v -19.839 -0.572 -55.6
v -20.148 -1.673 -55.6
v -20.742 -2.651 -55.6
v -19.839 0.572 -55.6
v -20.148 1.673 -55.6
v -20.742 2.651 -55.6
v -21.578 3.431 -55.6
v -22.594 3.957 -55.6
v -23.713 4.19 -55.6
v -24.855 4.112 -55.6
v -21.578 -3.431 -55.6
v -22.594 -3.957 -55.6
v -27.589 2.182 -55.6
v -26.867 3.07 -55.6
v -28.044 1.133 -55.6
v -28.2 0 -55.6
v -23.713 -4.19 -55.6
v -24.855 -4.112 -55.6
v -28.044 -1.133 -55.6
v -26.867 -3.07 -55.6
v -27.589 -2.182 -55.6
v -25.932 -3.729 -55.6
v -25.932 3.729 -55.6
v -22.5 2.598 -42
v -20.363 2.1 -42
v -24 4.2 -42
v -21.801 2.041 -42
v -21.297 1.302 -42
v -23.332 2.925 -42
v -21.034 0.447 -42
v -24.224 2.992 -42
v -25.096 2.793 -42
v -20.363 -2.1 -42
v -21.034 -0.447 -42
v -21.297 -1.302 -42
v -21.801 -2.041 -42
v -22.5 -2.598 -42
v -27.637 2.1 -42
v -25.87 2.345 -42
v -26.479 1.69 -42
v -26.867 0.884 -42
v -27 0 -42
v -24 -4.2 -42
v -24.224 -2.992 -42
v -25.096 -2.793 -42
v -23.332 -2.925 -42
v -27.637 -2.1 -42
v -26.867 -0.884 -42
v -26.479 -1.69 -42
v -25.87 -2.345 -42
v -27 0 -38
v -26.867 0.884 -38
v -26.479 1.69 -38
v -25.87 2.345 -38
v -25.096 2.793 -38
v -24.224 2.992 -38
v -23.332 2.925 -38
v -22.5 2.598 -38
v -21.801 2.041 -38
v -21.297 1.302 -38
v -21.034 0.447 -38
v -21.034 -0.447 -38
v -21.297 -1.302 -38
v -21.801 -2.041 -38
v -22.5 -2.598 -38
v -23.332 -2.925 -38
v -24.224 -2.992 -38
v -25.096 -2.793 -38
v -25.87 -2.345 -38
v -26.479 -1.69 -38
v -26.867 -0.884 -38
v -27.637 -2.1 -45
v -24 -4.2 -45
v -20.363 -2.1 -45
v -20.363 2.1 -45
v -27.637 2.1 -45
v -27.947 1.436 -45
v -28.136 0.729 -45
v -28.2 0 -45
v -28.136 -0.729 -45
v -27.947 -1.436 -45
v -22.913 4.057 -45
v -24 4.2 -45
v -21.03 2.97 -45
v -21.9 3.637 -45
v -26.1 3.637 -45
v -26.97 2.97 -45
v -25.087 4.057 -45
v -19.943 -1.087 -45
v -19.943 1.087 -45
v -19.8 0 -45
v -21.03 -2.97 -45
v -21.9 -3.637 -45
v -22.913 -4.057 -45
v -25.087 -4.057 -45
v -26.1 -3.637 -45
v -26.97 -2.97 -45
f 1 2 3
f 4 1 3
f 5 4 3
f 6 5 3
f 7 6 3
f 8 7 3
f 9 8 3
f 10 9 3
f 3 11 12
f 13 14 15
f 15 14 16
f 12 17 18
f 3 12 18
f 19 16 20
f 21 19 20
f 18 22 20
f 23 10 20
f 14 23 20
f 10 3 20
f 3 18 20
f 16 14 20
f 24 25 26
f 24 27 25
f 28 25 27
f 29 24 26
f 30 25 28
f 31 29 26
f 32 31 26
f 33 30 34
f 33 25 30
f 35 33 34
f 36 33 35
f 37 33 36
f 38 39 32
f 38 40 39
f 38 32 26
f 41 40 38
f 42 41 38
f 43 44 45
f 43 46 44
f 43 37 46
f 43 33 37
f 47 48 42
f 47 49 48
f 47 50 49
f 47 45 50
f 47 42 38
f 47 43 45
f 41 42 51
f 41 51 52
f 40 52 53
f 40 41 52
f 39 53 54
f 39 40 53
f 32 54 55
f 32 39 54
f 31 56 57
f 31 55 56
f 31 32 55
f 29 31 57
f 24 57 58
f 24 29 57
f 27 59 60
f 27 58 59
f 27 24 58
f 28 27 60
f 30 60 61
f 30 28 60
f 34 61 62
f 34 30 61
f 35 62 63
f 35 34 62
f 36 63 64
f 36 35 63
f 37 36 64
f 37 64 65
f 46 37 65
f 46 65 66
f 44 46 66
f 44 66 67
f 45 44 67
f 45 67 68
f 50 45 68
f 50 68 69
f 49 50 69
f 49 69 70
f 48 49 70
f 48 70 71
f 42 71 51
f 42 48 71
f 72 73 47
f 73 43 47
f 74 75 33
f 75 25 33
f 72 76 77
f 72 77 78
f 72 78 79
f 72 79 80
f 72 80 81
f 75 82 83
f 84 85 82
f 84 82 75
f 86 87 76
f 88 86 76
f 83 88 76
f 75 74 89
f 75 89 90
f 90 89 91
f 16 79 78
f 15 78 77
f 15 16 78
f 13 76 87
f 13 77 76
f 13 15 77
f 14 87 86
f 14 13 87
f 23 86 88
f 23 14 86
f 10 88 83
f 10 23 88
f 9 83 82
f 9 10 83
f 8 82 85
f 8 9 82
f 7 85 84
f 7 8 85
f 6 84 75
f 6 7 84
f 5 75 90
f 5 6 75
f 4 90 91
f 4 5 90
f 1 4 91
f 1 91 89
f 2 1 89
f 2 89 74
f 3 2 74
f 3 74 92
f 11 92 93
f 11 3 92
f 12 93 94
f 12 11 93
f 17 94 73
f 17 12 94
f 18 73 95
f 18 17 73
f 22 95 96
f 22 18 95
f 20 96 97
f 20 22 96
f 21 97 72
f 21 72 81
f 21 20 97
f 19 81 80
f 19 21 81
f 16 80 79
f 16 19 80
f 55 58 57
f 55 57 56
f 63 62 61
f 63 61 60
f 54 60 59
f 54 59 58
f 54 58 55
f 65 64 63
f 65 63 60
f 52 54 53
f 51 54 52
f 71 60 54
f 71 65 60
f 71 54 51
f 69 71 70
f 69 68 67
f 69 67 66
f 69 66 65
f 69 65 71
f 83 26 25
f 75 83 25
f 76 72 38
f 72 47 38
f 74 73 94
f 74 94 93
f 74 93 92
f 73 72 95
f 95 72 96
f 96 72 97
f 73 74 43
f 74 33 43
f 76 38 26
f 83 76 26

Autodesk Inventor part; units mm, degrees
ref_plane "YZ Plane" through (0, 0, 0) normal (1, 0, 0) x (0, 1, 0)
ref_plane "XZ Plane" through (0, 0, 0) normal (0, 1, 0) x (-1, 0, 0)
ref_plane "XY Plane" through (0, 0, 0) normal (0, 0, 1) x (1, 0, 0)
sketch "Sketch1" plane through (0, 0, 0) normal (0, 1, 0) x (-1, 0, 0)
  line L0 (24, -38) -> (28.2, -38)
  line L1 (28.2, -38) -> (28.2, -55.6)
  line L2 (28.2, -55.6) -> (24, -55.6)
  line L3 (24, -55.6) -> (24, -38)
  line L4 (24, -38) -> (27, -38)
  line L5 (27, -38) -> (27, -42)
  line L6 (27, -42) -> (24, -42)
  line L7 (24, -42) -> (24, -38)
  line L8 (27, -42) -> (28.2, -42)
  line L9 (28.2, -42) -> (28.2, -38)
  line L10 (28.2, -38) -> (27, -38)
  line L11 (27, -38) -> (27, -42)
  point P0 (0, 0)
  dimension "d0" = 4.2
  dimension "d1" = 17.6
  dimension "d2" = 3
  dimension "d3" = 4
revolve "Revolution1" add sketch "Sketch1" angle 360 about axis through (-24, 0, -55.6) along (0, 0, 1) contours L0 L5 L6 L3 | L6 L8 L1 L2 L3
sketch "Sketch2" plane through (-24, 0, -42) normal (0, 0, 1) x (1, 0, 0)
  circle A0 centre (0, 0) radius 3 projected
  circle A1 centre (0, 0) radius 4.2 projected
  line L0 (0, 4.2) -> (3.6373, 2.1)
  line L1 (3.6373, 2.1) -> (3.6373, -2.1)
  line L2 (3.6373, -2.1) -> (0, -4.2)
  line L3 (0, -4.2) -> (-3.6373, -2.1)
  line L4 (-3.6373, -2.1) -> (-3.6373, 2.1)
  line L5 (-3.6373, 2.1) -> (0, 4.2)
  point P0 (24, 0)
  point P1 (-3.6373, 2.1)
  point P2 (-3.6373, 2.1)
  point P3 (-3.6373, -2.1)
  point P4 (-3.6373, -2.1)
  point P5 (0, -4.2)
  point P6 (0, -4.2)
  point P7 (3.6373, 2.1)
  point P8 (3.6373, 2.1)
extrude "Extrusion1" cut sketch "Sketch2" against normal blind 3 contours A1 L1 | L0 A1 | A1 L2 | L5 A1 | A1 L3 | L4 A1
properties part number "pm6m6 fitting dtraight"
